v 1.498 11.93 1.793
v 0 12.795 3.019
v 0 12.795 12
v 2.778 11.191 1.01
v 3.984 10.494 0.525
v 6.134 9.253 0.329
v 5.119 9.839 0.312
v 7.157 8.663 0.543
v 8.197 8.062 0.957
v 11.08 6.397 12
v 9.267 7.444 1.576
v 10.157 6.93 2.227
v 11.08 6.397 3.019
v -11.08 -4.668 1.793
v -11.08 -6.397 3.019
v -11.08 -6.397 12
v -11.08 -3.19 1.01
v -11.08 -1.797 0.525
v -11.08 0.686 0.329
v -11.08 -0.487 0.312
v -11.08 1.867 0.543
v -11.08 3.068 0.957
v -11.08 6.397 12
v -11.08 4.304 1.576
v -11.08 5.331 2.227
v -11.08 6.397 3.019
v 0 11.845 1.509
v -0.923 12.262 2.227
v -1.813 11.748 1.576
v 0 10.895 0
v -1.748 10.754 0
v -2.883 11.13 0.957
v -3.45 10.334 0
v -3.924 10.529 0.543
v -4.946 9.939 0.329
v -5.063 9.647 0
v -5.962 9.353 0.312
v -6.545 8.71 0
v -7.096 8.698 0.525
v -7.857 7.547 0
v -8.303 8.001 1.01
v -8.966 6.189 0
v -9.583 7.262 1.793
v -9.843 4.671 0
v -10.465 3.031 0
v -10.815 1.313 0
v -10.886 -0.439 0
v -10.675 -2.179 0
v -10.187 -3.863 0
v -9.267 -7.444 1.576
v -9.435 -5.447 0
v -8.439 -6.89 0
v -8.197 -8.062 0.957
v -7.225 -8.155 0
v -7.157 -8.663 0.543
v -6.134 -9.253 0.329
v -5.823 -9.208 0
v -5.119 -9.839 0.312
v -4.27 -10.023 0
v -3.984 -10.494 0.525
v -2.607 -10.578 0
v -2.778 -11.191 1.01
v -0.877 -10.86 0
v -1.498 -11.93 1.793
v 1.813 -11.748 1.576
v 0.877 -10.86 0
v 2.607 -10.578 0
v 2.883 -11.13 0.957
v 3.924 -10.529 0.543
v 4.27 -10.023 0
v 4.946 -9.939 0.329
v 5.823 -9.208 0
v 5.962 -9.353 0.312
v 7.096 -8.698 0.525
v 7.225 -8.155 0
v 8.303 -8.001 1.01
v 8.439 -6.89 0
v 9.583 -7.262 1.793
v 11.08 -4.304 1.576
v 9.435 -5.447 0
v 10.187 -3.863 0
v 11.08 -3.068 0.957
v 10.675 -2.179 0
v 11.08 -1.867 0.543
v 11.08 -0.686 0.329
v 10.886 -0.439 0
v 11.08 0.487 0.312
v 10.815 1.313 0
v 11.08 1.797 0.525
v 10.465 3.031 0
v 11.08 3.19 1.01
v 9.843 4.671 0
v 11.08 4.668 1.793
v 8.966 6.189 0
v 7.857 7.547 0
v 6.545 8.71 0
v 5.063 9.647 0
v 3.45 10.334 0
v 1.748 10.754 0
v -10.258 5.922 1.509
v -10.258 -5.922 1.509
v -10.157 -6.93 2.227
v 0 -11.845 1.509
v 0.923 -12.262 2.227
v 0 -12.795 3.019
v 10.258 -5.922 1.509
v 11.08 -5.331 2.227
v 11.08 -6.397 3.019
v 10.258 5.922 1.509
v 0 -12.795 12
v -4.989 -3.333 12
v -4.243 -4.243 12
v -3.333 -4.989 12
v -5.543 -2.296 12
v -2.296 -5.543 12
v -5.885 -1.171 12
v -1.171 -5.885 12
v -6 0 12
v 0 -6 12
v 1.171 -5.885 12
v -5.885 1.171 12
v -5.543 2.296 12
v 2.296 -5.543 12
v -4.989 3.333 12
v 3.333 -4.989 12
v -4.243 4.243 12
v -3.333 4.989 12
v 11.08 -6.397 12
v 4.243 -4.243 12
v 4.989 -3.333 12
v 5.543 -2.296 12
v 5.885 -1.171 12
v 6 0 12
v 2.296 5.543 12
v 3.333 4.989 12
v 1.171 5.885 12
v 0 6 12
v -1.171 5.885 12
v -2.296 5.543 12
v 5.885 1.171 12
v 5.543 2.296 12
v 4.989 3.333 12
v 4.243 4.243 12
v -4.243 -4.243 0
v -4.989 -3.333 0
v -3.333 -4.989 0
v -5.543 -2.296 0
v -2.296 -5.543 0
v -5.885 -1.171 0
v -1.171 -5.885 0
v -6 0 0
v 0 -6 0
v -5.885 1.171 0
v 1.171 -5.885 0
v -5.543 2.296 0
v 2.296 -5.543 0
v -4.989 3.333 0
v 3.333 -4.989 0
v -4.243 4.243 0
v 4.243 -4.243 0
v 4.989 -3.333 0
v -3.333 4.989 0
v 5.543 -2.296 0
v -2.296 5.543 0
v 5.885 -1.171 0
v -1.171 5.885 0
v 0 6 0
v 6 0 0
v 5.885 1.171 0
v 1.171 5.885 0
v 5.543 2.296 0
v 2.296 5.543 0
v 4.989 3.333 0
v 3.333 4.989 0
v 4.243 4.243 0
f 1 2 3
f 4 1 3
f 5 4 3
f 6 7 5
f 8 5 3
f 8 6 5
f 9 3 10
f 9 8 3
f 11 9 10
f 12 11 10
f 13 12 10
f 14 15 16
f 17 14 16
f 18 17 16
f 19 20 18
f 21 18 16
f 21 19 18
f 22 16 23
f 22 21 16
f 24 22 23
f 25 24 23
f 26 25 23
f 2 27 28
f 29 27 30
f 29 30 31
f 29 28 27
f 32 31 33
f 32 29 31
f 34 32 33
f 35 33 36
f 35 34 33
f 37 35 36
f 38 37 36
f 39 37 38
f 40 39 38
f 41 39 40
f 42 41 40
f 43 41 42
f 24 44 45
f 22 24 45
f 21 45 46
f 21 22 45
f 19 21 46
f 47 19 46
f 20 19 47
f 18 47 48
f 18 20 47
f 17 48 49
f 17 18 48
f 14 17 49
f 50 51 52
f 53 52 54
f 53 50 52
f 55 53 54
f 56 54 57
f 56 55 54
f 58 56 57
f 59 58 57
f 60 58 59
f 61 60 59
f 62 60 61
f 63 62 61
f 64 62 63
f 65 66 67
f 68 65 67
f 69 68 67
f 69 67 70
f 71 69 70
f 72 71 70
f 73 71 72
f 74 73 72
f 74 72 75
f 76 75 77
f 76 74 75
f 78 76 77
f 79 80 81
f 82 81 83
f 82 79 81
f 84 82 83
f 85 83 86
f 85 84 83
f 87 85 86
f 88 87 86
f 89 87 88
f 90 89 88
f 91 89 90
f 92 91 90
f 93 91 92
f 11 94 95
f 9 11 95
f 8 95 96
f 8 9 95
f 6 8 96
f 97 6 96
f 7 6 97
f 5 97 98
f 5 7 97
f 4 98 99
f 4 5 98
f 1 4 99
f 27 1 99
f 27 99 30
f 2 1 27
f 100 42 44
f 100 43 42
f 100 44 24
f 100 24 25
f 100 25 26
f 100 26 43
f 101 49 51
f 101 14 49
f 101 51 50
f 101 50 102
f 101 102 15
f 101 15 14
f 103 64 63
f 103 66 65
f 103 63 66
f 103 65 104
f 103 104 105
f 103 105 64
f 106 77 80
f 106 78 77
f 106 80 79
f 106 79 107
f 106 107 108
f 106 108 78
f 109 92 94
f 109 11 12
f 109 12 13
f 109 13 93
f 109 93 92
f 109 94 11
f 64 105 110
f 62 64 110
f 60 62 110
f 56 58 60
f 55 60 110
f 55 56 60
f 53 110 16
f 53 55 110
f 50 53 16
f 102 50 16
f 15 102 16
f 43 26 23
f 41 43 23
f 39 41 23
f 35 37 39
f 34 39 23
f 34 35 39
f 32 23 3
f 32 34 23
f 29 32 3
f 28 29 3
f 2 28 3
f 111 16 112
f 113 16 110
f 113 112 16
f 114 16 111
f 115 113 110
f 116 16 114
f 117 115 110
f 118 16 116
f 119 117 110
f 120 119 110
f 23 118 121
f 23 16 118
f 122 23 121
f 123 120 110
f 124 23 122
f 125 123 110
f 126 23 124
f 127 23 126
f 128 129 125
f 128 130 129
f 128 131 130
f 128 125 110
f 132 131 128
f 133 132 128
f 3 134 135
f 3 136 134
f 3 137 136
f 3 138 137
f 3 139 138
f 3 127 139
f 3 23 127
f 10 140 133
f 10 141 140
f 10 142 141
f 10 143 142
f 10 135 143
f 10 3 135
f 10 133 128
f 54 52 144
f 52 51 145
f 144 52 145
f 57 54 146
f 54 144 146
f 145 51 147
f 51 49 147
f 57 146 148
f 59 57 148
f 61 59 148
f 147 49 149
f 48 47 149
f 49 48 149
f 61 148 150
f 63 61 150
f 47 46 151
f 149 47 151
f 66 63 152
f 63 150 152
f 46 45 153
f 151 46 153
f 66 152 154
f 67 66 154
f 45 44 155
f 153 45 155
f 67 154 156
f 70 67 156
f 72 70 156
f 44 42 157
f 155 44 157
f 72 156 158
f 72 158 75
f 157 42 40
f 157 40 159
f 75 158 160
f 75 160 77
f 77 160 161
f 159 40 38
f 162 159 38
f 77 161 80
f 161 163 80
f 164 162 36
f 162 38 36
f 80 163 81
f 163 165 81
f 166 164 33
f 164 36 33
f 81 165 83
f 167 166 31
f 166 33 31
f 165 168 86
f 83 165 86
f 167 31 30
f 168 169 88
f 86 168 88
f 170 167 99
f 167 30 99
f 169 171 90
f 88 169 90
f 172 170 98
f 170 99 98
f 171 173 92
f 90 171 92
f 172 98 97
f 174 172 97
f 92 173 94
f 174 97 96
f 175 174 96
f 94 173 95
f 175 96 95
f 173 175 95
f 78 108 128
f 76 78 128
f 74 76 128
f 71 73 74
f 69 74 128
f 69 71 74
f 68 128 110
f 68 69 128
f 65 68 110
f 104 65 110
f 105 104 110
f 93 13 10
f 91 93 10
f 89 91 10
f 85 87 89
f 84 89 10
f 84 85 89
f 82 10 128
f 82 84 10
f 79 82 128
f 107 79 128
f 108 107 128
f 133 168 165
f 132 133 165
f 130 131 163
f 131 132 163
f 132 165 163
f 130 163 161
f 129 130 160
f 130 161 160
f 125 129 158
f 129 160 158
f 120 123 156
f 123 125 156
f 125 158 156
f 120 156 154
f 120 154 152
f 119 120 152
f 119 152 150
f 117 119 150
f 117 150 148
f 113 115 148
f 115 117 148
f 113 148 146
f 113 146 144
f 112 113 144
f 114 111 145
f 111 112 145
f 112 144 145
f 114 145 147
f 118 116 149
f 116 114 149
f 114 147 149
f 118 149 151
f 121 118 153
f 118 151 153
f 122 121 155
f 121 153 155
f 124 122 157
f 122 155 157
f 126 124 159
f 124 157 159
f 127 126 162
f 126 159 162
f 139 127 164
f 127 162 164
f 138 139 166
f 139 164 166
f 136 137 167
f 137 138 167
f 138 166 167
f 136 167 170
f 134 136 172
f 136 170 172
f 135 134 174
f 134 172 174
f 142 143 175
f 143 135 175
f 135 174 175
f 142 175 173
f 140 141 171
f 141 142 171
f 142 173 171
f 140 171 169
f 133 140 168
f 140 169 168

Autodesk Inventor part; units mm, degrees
ref_plane "YZ Plane" through (0, 0, 0) normal (1, 0, 0) x (0, 1, 0)
ref_plane "XZ Plane" through (0, 0, 0) normal (0, 1, 0) x (-1, 0, 0)
ref_plane "XY Plane" through (0, 0, 0) normal (0, 0, 1) x (1, 0, 0)
sketch "Sketch2" plane through (0, 0, 0) normal (0, 0, 1) x (1, 0, 0)
  line L0 (0, 12.7947) -> (11.0805, 6.3973)
  line L1 (11.0805, 6.3973) -> (11.0805, -6.3973)
  line L2 (11.0805, -6.3973) -> (0, -12.7947)
  line L3 (0, -12.7947) -> (-11.0805, -6.3973)
  line L4 (-11.0805, -6.3973) -> (-11.0805, 6.3973)
  line L5 (-11.0805, 6.3973) -> (0, 12.7947)
  circle A0 centre (0, 0) radius 6
  dimension "d0" = 12
extrude "Extrusion1" add sketch "Sketch2" along normal blind 12
sketch "Sketch5" plane through (0, 0, 0) normal (1, 0, 0) x (0, 1, 0)
  line L0 (13.8205, 4.649) -> (13.8205, -1.691)
  line L1 (13.8205, -1.691) -> (9.8308, -1.691)
  line L2 (9.8308, -1.691) -> (13.8205, 4.649)
  line L3 (0, -4.894) -> (0, 14.8157) projected
  point P0 (0, 0)
revolve "Revolution1" cut sketch "Sketch5" angle 360 about axis through (0, 0, 0) along (0, 0, 1)
properties part number "nut M12"
